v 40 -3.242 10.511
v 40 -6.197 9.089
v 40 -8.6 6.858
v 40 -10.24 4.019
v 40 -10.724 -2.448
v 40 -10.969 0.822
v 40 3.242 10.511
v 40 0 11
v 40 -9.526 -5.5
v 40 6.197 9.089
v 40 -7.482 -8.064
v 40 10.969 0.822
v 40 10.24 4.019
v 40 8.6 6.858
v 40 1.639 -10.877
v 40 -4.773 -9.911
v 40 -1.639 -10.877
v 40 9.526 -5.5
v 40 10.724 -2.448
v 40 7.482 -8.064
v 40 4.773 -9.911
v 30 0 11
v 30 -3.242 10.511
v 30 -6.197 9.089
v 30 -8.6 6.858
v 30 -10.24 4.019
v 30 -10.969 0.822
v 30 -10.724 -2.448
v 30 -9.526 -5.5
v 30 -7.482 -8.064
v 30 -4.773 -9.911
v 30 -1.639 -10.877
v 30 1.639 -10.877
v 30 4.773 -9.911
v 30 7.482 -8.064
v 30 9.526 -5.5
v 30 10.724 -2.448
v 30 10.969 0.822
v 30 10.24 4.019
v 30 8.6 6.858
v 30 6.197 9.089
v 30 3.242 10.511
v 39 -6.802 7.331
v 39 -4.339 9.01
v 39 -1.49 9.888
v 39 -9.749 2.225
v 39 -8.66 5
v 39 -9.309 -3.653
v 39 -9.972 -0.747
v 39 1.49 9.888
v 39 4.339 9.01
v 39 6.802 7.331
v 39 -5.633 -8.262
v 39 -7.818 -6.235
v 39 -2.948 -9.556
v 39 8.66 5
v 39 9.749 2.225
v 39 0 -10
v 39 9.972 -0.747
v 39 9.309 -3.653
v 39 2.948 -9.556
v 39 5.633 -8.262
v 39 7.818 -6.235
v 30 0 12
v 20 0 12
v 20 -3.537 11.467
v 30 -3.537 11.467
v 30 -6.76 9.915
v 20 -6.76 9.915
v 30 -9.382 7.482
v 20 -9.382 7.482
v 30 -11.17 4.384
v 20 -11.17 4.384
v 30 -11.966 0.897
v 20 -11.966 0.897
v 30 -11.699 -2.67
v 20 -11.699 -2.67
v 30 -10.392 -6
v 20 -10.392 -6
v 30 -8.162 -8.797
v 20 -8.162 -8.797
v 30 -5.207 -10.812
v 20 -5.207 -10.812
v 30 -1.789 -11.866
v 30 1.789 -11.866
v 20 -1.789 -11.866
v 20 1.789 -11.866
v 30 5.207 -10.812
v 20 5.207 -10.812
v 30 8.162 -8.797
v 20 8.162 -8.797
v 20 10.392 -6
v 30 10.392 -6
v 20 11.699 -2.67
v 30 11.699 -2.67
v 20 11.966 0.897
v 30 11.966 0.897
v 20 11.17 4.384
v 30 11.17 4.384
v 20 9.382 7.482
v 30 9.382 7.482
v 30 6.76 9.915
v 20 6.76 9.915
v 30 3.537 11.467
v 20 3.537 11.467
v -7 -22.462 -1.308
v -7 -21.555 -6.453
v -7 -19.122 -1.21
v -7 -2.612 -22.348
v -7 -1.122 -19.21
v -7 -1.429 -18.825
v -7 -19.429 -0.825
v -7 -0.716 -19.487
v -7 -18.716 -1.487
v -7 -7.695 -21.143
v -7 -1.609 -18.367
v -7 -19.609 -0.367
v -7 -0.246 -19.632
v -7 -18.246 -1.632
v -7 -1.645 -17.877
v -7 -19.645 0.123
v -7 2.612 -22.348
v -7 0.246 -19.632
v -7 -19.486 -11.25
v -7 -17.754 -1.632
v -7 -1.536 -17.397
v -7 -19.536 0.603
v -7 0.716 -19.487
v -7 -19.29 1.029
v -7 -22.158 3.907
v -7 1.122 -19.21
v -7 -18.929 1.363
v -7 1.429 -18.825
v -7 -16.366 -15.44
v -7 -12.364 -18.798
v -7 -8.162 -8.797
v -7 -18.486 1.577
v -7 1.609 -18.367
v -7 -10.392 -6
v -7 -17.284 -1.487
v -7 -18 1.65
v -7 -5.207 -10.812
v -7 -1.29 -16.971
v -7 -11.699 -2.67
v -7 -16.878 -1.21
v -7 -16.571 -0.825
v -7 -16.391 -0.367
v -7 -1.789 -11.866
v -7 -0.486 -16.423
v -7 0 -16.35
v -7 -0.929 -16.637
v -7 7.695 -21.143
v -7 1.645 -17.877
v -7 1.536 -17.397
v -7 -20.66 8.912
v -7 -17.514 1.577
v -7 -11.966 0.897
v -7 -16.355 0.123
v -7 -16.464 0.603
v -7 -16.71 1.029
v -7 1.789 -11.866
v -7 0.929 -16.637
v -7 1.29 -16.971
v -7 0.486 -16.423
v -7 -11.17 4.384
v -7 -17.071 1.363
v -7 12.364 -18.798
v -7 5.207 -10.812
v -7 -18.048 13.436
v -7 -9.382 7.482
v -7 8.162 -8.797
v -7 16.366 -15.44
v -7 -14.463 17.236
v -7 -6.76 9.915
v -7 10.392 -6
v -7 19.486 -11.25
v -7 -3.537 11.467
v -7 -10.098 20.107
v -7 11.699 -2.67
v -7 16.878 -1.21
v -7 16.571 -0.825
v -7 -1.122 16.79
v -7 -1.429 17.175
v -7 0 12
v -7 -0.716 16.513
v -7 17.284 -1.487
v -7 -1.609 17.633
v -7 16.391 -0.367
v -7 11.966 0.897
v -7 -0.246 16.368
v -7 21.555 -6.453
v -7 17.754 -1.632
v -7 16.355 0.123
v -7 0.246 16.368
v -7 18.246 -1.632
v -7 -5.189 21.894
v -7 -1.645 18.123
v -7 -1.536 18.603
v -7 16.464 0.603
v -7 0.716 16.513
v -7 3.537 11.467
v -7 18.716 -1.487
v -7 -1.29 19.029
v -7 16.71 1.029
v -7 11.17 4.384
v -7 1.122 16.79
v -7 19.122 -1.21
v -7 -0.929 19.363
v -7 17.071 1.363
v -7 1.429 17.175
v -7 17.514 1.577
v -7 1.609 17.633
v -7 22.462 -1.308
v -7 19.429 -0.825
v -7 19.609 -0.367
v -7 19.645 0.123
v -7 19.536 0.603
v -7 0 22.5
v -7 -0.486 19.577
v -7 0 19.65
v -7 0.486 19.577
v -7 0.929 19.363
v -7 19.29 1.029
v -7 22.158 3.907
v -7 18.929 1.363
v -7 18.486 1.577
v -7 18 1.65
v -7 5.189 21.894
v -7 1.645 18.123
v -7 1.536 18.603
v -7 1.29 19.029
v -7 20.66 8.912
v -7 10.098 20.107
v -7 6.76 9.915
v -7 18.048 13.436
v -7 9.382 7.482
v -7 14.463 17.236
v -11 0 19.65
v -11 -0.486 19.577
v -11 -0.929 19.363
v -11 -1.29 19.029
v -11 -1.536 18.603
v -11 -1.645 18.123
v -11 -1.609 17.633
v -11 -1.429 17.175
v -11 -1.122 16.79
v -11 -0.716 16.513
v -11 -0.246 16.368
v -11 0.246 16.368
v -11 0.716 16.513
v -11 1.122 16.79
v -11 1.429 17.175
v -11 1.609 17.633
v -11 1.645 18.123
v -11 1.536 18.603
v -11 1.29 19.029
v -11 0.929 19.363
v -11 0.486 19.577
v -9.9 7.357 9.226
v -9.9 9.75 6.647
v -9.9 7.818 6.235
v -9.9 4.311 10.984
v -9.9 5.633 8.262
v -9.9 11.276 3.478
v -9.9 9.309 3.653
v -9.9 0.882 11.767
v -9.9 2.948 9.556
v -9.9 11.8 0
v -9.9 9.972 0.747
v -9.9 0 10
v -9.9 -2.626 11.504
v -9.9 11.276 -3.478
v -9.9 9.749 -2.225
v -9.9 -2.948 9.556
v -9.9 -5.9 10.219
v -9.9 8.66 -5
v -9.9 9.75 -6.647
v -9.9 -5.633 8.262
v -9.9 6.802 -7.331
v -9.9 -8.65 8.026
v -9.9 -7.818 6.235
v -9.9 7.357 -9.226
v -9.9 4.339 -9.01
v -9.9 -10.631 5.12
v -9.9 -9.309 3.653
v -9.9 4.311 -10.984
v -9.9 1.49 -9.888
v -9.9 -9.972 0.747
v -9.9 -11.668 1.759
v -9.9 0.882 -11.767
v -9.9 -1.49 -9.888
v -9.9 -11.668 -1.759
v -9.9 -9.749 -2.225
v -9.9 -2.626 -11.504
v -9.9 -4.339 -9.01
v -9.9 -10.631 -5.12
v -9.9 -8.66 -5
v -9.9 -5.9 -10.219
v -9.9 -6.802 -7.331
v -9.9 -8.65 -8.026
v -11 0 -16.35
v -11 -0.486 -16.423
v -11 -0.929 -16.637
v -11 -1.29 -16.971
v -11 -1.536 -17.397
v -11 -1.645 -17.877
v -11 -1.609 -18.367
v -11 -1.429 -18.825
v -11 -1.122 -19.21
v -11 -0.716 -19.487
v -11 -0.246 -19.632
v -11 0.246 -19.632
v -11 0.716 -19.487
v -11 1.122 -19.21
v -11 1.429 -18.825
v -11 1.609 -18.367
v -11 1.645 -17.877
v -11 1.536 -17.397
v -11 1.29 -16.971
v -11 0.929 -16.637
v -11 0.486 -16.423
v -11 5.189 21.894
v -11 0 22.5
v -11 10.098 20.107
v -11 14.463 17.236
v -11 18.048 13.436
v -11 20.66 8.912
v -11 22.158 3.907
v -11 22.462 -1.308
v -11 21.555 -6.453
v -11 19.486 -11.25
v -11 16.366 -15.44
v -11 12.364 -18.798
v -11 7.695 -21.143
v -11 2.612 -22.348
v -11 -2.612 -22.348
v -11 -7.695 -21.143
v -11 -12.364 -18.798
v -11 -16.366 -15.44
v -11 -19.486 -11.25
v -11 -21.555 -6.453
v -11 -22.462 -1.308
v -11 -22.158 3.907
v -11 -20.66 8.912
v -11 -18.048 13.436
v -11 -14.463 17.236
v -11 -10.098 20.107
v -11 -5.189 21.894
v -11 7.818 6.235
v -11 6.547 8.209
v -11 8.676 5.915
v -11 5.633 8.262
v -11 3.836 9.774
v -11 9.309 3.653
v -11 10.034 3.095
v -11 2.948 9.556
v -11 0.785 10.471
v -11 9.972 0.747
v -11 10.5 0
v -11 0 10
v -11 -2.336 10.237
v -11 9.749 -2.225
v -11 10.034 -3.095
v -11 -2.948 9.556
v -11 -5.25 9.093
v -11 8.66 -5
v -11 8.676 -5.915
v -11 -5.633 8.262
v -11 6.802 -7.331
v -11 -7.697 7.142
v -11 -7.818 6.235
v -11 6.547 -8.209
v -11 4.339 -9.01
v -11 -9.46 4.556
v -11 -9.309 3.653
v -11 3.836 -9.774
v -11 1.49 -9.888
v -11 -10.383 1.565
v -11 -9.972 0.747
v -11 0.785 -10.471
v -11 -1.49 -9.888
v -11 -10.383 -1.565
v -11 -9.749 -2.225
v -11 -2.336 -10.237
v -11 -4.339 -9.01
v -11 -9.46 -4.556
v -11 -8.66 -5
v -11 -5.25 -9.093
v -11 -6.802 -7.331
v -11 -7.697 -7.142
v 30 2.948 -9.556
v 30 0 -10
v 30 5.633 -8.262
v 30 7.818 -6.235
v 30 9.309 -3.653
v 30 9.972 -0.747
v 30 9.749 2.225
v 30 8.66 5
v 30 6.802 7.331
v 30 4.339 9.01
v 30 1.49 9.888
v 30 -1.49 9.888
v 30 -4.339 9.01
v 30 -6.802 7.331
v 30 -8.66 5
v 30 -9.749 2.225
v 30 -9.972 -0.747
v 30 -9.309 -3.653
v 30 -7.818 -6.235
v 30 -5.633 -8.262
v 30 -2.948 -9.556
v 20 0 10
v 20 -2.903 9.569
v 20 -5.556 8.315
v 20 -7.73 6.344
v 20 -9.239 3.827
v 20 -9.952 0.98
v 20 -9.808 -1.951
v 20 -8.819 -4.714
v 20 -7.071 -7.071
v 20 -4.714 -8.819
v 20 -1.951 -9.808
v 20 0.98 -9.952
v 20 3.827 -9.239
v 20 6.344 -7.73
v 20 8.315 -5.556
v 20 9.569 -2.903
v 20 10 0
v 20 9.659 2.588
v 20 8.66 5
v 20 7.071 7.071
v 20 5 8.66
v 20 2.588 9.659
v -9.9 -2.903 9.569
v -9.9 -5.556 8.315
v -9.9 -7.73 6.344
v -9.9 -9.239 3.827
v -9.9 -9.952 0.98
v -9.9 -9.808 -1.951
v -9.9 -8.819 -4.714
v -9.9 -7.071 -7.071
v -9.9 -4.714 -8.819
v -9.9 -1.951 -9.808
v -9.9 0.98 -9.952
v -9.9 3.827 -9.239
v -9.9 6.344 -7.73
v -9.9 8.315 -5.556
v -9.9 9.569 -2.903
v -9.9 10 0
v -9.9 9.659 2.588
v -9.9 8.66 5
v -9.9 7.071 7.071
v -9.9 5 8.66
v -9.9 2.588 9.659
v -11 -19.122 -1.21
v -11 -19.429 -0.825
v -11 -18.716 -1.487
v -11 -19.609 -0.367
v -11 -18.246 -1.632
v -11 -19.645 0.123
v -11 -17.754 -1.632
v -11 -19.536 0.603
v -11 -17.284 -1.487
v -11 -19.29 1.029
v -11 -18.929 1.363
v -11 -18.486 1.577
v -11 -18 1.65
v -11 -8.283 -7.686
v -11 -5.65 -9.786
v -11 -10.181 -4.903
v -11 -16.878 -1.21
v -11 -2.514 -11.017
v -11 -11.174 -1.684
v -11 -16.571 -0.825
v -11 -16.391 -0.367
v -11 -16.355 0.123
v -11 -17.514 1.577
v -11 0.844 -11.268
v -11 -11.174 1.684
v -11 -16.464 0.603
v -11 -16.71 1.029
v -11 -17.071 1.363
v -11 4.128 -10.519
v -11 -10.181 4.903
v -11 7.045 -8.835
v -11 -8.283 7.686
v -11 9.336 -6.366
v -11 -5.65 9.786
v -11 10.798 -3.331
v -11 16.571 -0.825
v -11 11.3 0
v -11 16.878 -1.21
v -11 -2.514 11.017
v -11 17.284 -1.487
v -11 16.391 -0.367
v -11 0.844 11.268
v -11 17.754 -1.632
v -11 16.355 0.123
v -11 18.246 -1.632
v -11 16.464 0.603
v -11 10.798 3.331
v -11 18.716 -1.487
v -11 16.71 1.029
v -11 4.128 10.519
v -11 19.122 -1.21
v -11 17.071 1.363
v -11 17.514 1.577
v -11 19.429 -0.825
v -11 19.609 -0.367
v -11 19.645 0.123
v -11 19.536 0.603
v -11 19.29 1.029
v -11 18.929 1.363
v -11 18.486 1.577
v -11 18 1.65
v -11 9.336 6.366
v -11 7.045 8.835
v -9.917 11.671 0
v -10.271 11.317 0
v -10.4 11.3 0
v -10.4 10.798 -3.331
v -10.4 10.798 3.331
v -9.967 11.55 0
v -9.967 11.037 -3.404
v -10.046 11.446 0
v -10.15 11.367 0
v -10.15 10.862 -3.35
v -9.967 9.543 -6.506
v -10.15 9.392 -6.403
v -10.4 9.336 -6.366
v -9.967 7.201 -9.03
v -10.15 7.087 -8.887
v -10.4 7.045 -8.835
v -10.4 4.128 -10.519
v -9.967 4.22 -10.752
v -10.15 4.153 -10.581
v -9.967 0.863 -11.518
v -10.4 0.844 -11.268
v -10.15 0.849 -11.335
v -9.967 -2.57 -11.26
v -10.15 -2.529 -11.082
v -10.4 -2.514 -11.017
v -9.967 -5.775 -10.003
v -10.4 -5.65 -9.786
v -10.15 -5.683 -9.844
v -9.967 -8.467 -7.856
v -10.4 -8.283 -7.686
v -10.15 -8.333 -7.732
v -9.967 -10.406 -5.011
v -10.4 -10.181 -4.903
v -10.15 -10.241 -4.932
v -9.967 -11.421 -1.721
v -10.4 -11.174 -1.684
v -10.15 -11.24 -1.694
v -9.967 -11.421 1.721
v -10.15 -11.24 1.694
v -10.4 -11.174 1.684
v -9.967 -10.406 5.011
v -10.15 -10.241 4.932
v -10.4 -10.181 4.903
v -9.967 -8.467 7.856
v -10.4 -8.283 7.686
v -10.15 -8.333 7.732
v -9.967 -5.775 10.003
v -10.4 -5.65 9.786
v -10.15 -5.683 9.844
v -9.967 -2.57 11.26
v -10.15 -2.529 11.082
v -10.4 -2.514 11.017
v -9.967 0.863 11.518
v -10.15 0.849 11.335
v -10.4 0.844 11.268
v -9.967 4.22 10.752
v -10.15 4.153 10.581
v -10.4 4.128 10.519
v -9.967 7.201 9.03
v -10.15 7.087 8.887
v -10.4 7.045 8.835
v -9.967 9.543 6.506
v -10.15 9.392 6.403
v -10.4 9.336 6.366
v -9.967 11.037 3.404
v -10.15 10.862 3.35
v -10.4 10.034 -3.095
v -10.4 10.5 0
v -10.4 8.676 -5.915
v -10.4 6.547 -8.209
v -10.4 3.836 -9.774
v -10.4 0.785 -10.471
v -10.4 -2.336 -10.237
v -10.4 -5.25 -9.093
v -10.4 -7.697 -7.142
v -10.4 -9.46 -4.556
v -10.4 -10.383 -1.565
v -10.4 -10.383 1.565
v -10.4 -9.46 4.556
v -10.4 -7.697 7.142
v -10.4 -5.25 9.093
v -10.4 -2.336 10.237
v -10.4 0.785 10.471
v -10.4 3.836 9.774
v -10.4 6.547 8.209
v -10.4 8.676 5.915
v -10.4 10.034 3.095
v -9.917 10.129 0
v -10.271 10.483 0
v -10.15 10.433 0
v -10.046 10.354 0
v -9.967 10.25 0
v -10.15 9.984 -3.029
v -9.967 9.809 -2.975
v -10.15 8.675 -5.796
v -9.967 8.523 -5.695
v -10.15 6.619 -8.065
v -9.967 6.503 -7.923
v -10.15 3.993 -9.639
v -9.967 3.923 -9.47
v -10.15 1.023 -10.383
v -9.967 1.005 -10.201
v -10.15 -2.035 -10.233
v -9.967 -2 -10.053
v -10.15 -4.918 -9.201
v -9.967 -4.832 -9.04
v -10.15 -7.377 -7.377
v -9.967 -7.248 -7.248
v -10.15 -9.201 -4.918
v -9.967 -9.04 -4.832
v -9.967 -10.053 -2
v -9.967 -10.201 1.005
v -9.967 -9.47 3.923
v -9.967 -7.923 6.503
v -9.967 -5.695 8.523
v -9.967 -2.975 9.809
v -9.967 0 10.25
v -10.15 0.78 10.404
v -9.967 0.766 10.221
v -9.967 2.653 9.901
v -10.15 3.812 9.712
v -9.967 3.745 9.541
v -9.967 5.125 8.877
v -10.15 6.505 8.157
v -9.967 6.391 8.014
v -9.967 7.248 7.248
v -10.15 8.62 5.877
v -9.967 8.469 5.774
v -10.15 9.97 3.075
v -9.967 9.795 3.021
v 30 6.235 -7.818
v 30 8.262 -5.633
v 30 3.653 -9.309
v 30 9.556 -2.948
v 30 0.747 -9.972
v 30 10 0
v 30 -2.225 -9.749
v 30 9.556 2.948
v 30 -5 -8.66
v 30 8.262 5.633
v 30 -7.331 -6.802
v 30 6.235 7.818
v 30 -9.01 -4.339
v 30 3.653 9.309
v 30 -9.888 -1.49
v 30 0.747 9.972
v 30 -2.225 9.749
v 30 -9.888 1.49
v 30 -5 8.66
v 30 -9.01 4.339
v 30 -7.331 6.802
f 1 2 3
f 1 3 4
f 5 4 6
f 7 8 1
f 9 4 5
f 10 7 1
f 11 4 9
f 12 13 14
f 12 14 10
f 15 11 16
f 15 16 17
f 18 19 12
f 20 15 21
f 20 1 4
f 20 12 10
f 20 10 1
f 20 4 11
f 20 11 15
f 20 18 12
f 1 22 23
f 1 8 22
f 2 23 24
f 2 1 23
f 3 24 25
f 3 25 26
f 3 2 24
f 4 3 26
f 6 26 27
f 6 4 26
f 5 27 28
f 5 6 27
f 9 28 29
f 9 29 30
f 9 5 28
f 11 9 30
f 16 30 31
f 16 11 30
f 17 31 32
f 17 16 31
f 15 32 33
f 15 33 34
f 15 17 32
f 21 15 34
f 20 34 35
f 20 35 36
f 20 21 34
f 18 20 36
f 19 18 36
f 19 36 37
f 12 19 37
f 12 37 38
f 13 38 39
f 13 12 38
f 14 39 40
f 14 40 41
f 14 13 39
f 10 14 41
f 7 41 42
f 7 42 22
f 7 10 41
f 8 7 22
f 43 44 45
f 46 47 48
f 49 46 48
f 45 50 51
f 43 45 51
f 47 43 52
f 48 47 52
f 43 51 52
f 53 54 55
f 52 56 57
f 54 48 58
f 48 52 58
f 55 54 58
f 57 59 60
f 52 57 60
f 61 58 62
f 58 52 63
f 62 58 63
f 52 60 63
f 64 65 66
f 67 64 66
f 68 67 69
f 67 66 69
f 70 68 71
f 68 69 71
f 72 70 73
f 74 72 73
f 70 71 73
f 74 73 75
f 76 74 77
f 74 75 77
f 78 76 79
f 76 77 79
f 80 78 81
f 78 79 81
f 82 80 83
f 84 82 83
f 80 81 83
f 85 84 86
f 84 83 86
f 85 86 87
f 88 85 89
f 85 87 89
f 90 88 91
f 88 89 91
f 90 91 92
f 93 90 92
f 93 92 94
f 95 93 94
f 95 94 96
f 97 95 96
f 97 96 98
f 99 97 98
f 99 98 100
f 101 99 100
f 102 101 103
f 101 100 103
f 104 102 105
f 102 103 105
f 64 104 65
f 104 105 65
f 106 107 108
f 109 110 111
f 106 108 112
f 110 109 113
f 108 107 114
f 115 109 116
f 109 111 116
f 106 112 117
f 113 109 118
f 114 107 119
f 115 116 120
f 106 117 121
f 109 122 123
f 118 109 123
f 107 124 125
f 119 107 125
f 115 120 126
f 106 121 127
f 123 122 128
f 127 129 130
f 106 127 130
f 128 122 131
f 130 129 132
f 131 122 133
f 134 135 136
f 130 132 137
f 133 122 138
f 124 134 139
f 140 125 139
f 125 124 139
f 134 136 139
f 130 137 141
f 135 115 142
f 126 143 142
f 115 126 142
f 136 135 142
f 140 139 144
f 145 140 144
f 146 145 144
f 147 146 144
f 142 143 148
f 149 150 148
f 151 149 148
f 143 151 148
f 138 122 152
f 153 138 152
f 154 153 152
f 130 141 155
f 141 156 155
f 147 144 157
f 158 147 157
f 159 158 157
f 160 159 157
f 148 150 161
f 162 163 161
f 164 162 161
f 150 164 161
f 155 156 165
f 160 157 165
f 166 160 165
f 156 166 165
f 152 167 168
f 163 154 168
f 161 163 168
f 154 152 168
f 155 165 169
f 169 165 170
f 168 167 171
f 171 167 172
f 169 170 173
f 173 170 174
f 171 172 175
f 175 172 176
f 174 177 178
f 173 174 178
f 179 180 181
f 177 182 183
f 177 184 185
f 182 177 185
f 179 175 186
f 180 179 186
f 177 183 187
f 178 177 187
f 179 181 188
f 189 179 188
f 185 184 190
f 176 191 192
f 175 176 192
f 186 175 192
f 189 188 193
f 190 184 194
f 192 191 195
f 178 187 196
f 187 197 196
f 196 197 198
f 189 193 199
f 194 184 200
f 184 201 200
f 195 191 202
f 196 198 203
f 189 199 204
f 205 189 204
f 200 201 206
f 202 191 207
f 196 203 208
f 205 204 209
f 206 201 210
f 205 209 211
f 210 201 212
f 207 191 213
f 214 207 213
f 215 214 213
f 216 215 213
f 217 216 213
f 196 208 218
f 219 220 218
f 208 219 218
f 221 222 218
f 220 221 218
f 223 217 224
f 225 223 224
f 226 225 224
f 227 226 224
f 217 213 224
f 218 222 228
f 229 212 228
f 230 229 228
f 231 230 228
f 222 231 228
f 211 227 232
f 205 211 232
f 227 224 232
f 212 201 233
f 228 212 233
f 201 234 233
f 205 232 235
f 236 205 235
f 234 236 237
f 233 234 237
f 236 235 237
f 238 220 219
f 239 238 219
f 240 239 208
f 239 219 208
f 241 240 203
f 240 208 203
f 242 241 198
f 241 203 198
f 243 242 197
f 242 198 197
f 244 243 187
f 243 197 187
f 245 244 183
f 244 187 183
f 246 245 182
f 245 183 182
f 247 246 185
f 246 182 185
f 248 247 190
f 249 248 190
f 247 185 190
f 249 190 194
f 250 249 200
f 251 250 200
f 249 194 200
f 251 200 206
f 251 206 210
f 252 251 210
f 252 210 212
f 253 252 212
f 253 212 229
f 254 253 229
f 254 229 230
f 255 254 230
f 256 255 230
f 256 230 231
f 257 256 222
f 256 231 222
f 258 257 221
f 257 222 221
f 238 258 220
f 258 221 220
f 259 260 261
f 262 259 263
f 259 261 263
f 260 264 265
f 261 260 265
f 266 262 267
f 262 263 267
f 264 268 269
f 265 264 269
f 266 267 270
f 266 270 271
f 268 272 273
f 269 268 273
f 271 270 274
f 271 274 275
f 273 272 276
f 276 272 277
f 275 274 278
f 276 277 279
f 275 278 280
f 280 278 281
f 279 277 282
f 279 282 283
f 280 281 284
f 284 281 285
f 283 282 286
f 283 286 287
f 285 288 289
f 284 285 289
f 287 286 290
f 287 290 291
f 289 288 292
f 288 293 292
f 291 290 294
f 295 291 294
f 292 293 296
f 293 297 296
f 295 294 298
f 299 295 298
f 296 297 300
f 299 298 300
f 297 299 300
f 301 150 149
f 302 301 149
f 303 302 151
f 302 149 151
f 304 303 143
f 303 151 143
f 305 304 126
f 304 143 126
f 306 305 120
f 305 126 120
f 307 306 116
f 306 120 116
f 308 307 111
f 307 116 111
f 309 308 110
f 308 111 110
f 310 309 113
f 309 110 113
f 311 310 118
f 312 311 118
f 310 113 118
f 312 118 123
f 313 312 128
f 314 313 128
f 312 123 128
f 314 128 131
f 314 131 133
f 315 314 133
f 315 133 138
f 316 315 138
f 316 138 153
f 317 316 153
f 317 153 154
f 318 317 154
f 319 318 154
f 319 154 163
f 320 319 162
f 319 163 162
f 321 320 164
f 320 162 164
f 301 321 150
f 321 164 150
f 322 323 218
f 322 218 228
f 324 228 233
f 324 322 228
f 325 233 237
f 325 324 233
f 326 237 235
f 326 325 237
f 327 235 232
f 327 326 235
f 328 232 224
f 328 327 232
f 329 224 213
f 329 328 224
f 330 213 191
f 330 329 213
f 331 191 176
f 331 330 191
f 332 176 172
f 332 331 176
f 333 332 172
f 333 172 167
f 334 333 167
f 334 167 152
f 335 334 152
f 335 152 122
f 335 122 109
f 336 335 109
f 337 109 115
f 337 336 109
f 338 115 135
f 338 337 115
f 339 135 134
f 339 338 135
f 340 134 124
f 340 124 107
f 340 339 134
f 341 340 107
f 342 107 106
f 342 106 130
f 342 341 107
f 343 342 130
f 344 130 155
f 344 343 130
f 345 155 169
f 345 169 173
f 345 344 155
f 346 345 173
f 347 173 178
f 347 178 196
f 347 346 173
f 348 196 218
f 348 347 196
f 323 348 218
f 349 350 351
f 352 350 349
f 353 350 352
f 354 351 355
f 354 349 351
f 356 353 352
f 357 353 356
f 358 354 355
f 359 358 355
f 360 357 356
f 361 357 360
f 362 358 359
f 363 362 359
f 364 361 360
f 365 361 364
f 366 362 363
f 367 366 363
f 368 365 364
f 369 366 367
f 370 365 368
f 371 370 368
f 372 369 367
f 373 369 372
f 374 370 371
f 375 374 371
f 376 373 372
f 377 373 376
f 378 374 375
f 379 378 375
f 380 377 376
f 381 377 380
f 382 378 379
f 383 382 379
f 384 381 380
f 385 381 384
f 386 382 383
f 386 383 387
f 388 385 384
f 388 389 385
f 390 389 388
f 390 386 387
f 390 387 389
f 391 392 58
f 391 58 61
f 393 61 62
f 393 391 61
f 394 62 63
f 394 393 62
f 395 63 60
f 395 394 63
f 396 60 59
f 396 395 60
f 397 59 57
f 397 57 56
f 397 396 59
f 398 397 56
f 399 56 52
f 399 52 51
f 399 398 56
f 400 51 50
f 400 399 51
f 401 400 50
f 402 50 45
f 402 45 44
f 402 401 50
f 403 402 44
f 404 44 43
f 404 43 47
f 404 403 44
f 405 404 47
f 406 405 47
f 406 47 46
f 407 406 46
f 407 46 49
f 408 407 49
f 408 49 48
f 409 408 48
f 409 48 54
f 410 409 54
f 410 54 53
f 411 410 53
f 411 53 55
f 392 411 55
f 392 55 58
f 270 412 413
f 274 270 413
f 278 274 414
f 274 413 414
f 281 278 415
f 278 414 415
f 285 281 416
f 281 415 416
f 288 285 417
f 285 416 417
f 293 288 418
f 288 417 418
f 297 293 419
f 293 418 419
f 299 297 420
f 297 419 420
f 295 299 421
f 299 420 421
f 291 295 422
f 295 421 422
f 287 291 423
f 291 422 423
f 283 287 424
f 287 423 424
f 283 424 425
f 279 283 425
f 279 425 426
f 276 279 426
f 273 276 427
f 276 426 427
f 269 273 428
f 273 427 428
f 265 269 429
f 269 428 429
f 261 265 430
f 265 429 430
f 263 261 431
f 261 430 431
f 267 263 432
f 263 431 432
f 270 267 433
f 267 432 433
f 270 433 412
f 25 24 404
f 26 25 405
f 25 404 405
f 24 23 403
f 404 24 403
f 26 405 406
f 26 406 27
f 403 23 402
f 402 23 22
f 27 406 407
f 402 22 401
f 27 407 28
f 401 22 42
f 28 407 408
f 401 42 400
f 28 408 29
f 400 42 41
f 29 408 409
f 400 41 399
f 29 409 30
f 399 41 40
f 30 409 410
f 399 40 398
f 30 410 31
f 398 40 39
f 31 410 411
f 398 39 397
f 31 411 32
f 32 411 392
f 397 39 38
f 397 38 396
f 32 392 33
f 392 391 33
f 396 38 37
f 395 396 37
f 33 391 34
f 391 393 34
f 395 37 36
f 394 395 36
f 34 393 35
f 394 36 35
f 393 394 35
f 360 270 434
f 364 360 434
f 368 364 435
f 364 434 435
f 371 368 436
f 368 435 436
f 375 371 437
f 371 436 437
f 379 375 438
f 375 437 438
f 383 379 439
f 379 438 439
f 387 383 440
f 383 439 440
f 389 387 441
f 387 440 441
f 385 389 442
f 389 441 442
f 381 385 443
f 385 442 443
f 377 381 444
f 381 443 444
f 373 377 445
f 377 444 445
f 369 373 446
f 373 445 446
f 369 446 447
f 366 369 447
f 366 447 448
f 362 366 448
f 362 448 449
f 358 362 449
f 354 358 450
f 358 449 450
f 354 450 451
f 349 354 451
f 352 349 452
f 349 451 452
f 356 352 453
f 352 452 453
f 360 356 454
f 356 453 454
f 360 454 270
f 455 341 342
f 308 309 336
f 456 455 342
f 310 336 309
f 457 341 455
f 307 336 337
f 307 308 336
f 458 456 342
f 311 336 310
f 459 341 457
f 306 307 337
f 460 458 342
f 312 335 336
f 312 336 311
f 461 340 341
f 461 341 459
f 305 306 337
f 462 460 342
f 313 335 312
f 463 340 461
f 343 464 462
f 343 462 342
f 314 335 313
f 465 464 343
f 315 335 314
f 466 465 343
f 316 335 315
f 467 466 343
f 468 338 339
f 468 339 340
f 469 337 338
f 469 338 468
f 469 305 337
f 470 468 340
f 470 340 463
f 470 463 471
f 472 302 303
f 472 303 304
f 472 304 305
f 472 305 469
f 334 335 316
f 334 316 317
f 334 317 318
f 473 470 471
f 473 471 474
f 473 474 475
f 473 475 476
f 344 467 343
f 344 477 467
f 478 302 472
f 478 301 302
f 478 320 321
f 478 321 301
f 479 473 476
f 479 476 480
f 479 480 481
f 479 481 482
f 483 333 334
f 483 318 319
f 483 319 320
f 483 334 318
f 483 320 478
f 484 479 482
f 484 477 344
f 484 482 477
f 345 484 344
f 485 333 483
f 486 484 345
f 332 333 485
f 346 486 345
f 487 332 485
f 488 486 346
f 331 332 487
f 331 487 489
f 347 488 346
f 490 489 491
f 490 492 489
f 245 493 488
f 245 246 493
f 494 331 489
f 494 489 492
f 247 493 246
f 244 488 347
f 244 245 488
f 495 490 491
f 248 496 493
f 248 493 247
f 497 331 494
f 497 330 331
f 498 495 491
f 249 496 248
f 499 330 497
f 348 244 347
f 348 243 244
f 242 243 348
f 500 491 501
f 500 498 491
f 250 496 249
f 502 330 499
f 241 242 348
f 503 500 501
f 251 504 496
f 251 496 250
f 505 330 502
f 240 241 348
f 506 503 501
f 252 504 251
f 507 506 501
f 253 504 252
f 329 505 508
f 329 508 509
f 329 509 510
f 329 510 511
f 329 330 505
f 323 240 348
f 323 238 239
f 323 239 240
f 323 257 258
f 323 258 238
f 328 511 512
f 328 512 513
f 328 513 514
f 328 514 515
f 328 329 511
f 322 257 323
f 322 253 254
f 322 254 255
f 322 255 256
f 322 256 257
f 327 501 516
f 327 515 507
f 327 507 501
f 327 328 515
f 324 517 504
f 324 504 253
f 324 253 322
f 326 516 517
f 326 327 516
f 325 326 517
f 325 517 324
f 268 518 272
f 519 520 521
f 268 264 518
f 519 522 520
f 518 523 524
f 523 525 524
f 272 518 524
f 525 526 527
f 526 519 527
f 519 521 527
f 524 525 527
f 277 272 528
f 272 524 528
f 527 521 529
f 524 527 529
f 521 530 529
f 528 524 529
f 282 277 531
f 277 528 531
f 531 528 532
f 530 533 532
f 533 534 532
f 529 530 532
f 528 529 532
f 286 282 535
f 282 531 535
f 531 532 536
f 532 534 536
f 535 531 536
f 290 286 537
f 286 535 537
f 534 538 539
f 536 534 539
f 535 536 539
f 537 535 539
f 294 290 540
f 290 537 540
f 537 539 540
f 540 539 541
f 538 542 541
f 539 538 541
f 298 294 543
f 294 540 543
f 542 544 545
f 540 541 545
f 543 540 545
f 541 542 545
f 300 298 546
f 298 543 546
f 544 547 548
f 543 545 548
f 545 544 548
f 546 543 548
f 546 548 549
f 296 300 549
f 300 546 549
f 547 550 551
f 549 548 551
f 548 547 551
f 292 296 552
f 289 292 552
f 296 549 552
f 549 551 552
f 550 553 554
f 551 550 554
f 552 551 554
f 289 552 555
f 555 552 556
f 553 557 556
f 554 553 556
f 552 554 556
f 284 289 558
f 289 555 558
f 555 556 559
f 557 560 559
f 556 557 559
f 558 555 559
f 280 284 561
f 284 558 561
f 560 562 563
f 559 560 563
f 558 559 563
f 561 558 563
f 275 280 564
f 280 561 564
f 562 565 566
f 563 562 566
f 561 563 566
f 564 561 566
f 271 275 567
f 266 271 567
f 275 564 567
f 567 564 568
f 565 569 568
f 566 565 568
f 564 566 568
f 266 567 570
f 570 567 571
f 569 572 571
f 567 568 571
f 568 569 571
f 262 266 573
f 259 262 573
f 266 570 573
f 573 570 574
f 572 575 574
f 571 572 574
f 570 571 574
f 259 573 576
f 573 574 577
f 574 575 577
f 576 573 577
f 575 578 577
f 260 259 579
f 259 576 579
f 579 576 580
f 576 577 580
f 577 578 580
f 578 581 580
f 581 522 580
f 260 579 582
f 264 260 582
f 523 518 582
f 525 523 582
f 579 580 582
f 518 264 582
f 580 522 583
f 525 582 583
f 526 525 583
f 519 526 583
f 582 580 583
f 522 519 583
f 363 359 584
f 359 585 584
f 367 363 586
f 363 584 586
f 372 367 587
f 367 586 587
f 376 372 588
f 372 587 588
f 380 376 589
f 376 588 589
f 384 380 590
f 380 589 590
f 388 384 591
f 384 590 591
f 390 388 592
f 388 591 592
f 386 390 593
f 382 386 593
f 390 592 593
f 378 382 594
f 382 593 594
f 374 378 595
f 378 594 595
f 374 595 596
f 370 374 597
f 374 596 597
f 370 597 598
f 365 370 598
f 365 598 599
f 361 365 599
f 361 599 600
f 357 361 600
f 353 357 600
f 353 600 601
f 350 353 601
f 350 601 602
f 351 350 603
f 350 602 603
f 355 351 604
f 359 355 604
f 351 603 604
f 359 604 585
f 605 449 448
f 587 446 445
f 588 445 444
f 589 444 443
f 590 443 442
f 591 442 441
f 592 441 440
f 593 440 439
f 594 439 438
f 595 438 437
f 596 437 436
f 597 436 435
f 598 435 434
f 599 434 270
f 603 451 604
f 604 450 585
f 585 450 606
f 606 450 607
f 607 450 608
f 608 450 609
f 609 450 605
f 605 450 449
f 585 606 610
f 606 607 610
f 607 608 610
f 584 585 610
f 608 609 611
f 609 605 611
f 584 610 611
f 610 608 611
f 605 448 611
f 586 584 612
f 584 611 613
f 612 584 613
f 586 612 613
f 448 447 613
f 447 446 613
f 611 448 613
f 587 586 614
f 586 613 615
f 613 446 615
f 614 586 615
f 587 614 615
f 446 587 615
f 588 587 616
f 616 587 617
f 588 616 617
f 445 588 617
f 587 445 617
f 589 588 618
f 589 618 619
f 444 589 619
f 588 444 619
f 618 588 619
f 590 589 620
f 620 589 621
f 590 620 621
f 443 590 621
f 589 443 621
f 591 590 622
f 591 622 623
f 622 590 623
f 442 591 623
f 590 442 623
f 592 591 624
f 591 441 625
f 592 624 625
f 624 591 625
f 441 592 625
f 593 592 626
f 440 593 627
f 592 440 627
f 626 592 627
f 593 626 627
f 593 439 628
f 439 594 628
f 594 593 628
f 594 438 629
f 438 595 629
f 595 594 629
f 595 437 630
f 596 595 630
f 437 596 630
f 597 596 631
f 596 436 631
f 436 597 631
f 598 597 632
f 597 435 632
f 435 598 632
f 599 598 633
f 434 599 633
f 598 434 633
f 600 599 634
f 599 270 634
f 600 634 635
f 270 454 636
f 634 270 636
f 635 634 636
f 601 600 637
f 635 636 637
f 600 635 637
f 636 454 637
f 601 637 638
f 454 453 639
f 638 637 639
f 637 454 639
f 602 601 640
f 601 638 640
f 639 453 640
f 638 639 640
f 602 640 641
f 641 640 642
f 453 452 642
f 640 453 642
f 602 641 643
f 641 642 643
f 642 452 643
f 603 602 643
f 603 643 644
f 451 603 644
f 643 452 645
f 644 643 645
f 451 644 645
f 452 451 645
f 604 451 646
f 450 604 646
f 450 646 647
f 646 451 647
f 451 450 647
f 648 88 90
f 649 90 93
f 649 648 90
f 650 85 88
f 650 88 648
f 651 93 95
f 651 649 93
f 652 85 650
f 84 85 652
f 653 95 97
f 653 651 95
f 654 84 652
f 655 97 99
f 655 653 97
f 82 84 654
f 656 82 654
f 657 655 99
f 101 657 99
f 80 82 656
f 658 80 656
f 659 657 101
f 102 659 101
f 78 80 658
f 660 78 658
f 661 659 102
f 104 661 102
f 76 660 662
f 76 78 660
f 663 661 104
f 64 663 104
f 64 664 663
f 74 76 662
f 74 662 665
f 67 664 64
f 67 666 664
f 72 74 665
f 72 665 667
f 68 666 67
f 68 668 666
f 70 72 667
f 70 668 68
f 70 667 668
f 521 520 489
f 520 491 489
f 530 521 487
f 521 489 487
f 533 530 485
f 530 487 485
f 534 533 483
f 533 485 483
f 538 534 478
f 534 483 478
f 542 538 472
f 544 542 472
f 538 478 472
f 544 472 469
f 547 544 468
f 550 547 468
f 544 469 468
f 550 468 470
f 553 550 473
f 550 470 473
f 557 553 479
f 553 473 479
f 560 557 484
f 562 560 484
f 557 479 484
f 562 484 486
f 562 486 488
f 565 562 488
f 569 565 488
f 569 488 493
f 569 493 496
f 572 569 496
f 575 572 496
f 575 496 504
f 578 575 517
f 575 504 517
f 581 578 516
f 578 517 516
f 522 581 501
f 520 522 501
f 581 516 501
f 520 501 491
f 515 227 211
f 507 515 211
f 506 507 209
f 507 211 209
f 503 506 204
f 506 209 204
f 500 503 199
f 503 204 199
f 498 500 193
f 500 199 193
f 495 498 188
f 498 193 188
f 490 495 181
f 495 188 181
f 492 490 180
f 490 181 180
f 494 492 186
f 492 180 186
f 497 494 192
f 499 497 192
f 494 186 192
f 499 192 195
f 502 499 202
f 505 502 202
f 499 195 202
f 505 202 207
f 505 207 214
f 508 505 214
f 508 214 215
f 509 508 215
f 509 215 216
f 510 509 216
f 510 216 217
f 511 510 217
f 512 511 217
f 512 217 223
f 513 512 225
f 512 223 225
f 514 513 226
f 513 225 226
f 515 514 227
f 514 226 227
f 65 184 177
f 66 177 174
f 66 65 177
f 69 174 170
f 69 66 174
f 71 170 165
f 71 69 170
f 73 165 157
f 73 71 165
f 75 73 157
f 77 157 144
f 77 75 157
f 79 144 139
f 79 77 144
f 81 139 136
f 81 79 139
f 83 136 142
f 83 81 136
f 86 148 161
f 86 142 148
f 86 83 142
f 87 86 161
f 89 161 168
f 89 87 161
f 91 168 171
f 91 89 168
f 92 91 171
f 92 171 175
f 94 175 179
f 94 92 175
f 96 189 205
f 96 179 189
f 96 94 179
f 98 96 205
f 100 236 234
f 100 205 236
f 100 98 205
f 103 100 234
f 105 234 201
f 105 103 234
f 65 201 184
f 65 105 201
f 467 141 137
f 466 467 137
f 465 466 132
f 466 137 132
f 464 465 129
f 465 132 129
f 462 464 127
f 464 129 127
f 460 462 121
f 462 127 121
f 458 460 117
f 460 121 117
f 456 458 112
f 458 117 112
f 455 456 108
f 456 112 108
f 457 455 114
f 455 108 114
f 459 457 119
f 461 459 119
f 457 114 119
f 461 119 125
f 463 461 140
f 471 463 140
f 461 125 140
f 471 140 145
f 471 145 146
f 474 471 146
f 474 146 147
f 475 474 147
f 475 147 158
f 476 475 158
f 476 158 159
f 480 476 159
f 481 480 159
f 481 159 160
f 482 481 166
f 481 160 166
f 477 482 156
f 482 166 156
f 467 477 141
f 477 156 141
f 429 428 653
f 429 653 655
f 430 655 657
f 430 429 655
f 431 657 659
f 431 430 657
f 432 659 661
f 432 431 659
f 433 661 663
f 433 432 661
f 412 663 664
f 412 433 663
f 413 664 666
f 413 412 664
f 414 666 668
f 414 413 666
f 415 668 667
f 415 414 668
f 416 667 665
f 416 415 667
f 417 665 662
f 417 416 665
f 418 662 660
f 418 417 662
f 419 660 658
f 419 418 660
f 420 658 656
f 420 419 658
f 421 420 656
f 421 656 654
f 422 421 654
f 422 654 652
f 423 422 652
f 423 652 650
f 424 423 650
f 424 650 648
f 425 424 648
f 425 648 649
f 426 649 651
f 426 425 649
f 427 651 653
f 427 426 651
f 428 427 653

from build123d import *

# Parameters (mm, degrees)
SKETCH_1_W                  = 31
SKETCH_1_H                  = 2
SKETCH_6_R                  = 22.5
SKETCH_6_R_2                = 12
EXTRUDE_1_DEPTH             = 4
SKETCH_8_R                  = 12
SKETCH_8_R_2                = 10
EXTRUDE_3_DEPTH             = 10
SKETCH_9_R                  = 12
EXTRUDE_5_DEPTH             = 10
SKETCH_18_R                 = 10
CUT_EXTRUDE_1_DEPTH         = 46
SKETCH_17_W                 = 1.65
SKETCH_17_H                 = 51
HOLE_WIZARD_M4_1_AT_2_COUNT = 2
HOLE_WIZARD_M4_1_AT_2_PITCH = 25.455844123
HOLE_WIZARD_M4_1_AT_3_COUNT = 2
HOLE_WIZARD_M4_1_AT_3_PITCH = 36
HOLE_WIZARD_M4_1_AT_4_COUNT = 2
HOLE_WIZARD_M4_1_AT_4_PITCH = 25.455844123
SKETCH_12_W                 = 1
SKETCH_12_H                 = 2
SKETCH_19_R                 = 12
SKETCH_19_R_2               = 11
CUT_EXTRUDE_3_DEPTH         = 10


with BuildPart() as part:
    # 草图1 → 旋转1 (revolve)
    with BuildSketch(Plane.XY, mode=Mode.PRIVATE) as revolve_1_sk:
        with Locations((4.5, 11)):
            Rectangle(SKETCH_1_W, SKETCH_1_H)
    revolve(revolve_1_sk.sketch.rotate(Axis((-11, 0, 0), (1, 0, 0)), 90), axis=Axis((-11, 0, 0), (1, 0, 0)))

    # 草图5 → 切除-旋转1 (revolve, cut)
    with BuildSketch(Plane.XY):
        with BuildLine():
            Line((-11, 10.5), (-10.4, 10.5))
            ThreePointArc((-10.4, 10.5), (-10.046446609, 10.353553391), (-9.9, 10))
            Line((-9.9, 10), (-9.9, 11.8))
            ThreePointArc((-9.9, 11.8), (-10.046446609, 11.446446609), (-10.4, 11.3))
            Line((-10.4, 11.3), (-11, 11.3))
            Line((-11, 11.3), (-11, 10.5))
        make_face()
    revolve(axis=Axis((0, 0, 0), (-1, 0, 0)), mode=Mode.SUBTRACT)


with BuildPart() as cut_revolve_1_piece_1:
    # of the separate pieces the step leaves, piece 1, a body of its own (cut_revolve_1_pieces)
    add(part.part.solids().sort_by_distance((20, 0, 10))[0])

    # 草图6 → 凸台-拉伸1 (add)
    with BuildSketch(Plane.ZY.offset(11)):
        Circle(SKETCH_6_R)
        Circle(SKETCH_6_R_2, mode=Mode.SUBTRACT)
    extrude(amount=-EXTRUDE_1_DEPTH)

    # 草图8 → 凸台-拉伸3 (add)
    with BuildSketch(Plane(origin=(20, 0, 0), x_dir=(0, 0, -1), z_dir=(1, 0, 0))):
        with Locations(Location((0, 0, 0), (0, 0, 180))):
            Circle(SKETCH_8_R)
        with Locations(Location((0, 0, 0), (0, 0, 90))):
            Circle(SKETCH_8_R_2, mode=Mode.SUBTRACT)
    extrude(amount=EXTRUDE_3_DEPTH)

    # 草图17 → M4 螺纹孔1 (revolve, cut)
    with BuildSketch(Plane(origin=(-11, 18, 0), x_dir=(0, 0, 1), z_dir=(0, 1, 0))):
        with Locations((0.825, 25.5)):
            Rectangle(SKETCH_17_W, SKETCH_17_H)
    hole_wizard_m4_1 = revolve(axis=Axis((-17.35, 18, 0), (1, 0, 0)), mode=Mode.SUBTRACT)

    # M4 螺纹孔1 at 2: M4 螺纹孔1 ×2
    with Locations(*[Vector(0, -0.7071067811865476, 0.7071067811865476) * (i * HOLE_WIZARD_M4_1_AT_2_PITCH) for i in range(1, HOLE_WIZARD_M4_1_AT_2_COUNT)]):
        add(hole_wizard_m4_1, mode=Mode.SUBTRACT)

    # M4 螺纹孔1 at 3: M4 螺纹孔1 ×2
    with Locations(*[(0, -i * HOLE_WIZARD_M4_1_AT_3_PITCH, 0) for i in range(1, HOLE_WIZARD_M4_1_AT_3_COUNT)]):
        add(hole_wizard_m4_1, mode=Mode.SUBTRACT)

    # M4 螺纹孔1 at 4: M4 螺纹孔1 ×2
    with Locations(*[Vector(0, -0.7071067811865477, -0.7071067811865475) * (i * HOLE_WIZARD_M4_1_AT_4_PITCH) for i in range(1, HOLE_WIZARD_M4_1_AT_4_COUNT)]):
        add(hole_wizard_m4_1, mode=Mode.SUBTRACT)


with BuildPart() as cut_revolve_1_piece_2:
    # of the separate pieces the step leaves, piece 2, a body of its own (cut_revolve_1_pieces)
    add(part.part.solids().sort_by_distance((-11, 0, 10))[0])


with BuildPart() as body_3:
    # 草图9 → 凸台-拉伸5 (new body)
    with BuildSketch(Plane(origin=(30, 0, 0), x_dir=(0, 0, -1), z_dir=(1, 0, 0))):
        Circle(SKETCH_9_R)
    extrude(amount=EXTRUDE_5_DEPTH)

    # 草图18 → 切除-拉伸1 (cut)
    with BuildSketch(Plane(origin=(-7, 0, 0), x_dir=(0, 0, -1), z_dir=(1, 0, 0))):
        Circle(SKETCH_18_R)
    extrude(amount=CUT_EXTRUDE_1_DEPTH, mode=Mode.SUBTRACT)

    # 草图12 → 切除-旋转2 (revolve, cut)
    with BuildSketch(Plane.XY, mode=Mode.PRIVATE) as cut_revolve_2_sk:
        with Locations((33.5, -12)):
            Rectangle(SKETCH_12_W, SKETCH_12_H)
        with Locations((31.5, -12)):
            Rectangle(SKETCH_12_W, SKETCH_12_H)
        with Locations((35.5, -12)):
            Rectangle(SKETCH_12_W, SKETCH_12_H)
        with Locations((37.5, -12)):
            Rectangle(SKETCH_12_W, SKETCH_12_H)
        with Locations((39.5, -12)):
            Rectangle(SKETCH_12_W, SKETCH_12_H)
    revolve(cut_revolve_2_sk.sketch.rotate(Axis((0, 0, 0), (1, 0, 0)), 270), axis=Axis((0, 0, 0), (1, 0, 0)), mode=Mode.SUBTRACT)

    # 草图19 → 切除-拉伸3 (cut)
    with BuildSketch(Plane(origin=(40, 0, 0), x_dir=(0, 0, -1), z_dir=(1, 0, 0))):
        with Locations(Location((0, 0, 0), (0, 0, 180))):
            Circle(SKETCH_19_R)
        with Locations(Location((0, 0, 0), (0, 0, 180))):
            Circle(SKETCH_19_R_2, mode=Mode.SUBTRACT)
    extrude(amount=-CUT_EXTRUDE_3_DEPTH, mode=Mode.SUBTRACT)


solid = Compound([cut_revolve_1_piece_1.part, cut_revolve_1_piece_2.part, body_3.part])
